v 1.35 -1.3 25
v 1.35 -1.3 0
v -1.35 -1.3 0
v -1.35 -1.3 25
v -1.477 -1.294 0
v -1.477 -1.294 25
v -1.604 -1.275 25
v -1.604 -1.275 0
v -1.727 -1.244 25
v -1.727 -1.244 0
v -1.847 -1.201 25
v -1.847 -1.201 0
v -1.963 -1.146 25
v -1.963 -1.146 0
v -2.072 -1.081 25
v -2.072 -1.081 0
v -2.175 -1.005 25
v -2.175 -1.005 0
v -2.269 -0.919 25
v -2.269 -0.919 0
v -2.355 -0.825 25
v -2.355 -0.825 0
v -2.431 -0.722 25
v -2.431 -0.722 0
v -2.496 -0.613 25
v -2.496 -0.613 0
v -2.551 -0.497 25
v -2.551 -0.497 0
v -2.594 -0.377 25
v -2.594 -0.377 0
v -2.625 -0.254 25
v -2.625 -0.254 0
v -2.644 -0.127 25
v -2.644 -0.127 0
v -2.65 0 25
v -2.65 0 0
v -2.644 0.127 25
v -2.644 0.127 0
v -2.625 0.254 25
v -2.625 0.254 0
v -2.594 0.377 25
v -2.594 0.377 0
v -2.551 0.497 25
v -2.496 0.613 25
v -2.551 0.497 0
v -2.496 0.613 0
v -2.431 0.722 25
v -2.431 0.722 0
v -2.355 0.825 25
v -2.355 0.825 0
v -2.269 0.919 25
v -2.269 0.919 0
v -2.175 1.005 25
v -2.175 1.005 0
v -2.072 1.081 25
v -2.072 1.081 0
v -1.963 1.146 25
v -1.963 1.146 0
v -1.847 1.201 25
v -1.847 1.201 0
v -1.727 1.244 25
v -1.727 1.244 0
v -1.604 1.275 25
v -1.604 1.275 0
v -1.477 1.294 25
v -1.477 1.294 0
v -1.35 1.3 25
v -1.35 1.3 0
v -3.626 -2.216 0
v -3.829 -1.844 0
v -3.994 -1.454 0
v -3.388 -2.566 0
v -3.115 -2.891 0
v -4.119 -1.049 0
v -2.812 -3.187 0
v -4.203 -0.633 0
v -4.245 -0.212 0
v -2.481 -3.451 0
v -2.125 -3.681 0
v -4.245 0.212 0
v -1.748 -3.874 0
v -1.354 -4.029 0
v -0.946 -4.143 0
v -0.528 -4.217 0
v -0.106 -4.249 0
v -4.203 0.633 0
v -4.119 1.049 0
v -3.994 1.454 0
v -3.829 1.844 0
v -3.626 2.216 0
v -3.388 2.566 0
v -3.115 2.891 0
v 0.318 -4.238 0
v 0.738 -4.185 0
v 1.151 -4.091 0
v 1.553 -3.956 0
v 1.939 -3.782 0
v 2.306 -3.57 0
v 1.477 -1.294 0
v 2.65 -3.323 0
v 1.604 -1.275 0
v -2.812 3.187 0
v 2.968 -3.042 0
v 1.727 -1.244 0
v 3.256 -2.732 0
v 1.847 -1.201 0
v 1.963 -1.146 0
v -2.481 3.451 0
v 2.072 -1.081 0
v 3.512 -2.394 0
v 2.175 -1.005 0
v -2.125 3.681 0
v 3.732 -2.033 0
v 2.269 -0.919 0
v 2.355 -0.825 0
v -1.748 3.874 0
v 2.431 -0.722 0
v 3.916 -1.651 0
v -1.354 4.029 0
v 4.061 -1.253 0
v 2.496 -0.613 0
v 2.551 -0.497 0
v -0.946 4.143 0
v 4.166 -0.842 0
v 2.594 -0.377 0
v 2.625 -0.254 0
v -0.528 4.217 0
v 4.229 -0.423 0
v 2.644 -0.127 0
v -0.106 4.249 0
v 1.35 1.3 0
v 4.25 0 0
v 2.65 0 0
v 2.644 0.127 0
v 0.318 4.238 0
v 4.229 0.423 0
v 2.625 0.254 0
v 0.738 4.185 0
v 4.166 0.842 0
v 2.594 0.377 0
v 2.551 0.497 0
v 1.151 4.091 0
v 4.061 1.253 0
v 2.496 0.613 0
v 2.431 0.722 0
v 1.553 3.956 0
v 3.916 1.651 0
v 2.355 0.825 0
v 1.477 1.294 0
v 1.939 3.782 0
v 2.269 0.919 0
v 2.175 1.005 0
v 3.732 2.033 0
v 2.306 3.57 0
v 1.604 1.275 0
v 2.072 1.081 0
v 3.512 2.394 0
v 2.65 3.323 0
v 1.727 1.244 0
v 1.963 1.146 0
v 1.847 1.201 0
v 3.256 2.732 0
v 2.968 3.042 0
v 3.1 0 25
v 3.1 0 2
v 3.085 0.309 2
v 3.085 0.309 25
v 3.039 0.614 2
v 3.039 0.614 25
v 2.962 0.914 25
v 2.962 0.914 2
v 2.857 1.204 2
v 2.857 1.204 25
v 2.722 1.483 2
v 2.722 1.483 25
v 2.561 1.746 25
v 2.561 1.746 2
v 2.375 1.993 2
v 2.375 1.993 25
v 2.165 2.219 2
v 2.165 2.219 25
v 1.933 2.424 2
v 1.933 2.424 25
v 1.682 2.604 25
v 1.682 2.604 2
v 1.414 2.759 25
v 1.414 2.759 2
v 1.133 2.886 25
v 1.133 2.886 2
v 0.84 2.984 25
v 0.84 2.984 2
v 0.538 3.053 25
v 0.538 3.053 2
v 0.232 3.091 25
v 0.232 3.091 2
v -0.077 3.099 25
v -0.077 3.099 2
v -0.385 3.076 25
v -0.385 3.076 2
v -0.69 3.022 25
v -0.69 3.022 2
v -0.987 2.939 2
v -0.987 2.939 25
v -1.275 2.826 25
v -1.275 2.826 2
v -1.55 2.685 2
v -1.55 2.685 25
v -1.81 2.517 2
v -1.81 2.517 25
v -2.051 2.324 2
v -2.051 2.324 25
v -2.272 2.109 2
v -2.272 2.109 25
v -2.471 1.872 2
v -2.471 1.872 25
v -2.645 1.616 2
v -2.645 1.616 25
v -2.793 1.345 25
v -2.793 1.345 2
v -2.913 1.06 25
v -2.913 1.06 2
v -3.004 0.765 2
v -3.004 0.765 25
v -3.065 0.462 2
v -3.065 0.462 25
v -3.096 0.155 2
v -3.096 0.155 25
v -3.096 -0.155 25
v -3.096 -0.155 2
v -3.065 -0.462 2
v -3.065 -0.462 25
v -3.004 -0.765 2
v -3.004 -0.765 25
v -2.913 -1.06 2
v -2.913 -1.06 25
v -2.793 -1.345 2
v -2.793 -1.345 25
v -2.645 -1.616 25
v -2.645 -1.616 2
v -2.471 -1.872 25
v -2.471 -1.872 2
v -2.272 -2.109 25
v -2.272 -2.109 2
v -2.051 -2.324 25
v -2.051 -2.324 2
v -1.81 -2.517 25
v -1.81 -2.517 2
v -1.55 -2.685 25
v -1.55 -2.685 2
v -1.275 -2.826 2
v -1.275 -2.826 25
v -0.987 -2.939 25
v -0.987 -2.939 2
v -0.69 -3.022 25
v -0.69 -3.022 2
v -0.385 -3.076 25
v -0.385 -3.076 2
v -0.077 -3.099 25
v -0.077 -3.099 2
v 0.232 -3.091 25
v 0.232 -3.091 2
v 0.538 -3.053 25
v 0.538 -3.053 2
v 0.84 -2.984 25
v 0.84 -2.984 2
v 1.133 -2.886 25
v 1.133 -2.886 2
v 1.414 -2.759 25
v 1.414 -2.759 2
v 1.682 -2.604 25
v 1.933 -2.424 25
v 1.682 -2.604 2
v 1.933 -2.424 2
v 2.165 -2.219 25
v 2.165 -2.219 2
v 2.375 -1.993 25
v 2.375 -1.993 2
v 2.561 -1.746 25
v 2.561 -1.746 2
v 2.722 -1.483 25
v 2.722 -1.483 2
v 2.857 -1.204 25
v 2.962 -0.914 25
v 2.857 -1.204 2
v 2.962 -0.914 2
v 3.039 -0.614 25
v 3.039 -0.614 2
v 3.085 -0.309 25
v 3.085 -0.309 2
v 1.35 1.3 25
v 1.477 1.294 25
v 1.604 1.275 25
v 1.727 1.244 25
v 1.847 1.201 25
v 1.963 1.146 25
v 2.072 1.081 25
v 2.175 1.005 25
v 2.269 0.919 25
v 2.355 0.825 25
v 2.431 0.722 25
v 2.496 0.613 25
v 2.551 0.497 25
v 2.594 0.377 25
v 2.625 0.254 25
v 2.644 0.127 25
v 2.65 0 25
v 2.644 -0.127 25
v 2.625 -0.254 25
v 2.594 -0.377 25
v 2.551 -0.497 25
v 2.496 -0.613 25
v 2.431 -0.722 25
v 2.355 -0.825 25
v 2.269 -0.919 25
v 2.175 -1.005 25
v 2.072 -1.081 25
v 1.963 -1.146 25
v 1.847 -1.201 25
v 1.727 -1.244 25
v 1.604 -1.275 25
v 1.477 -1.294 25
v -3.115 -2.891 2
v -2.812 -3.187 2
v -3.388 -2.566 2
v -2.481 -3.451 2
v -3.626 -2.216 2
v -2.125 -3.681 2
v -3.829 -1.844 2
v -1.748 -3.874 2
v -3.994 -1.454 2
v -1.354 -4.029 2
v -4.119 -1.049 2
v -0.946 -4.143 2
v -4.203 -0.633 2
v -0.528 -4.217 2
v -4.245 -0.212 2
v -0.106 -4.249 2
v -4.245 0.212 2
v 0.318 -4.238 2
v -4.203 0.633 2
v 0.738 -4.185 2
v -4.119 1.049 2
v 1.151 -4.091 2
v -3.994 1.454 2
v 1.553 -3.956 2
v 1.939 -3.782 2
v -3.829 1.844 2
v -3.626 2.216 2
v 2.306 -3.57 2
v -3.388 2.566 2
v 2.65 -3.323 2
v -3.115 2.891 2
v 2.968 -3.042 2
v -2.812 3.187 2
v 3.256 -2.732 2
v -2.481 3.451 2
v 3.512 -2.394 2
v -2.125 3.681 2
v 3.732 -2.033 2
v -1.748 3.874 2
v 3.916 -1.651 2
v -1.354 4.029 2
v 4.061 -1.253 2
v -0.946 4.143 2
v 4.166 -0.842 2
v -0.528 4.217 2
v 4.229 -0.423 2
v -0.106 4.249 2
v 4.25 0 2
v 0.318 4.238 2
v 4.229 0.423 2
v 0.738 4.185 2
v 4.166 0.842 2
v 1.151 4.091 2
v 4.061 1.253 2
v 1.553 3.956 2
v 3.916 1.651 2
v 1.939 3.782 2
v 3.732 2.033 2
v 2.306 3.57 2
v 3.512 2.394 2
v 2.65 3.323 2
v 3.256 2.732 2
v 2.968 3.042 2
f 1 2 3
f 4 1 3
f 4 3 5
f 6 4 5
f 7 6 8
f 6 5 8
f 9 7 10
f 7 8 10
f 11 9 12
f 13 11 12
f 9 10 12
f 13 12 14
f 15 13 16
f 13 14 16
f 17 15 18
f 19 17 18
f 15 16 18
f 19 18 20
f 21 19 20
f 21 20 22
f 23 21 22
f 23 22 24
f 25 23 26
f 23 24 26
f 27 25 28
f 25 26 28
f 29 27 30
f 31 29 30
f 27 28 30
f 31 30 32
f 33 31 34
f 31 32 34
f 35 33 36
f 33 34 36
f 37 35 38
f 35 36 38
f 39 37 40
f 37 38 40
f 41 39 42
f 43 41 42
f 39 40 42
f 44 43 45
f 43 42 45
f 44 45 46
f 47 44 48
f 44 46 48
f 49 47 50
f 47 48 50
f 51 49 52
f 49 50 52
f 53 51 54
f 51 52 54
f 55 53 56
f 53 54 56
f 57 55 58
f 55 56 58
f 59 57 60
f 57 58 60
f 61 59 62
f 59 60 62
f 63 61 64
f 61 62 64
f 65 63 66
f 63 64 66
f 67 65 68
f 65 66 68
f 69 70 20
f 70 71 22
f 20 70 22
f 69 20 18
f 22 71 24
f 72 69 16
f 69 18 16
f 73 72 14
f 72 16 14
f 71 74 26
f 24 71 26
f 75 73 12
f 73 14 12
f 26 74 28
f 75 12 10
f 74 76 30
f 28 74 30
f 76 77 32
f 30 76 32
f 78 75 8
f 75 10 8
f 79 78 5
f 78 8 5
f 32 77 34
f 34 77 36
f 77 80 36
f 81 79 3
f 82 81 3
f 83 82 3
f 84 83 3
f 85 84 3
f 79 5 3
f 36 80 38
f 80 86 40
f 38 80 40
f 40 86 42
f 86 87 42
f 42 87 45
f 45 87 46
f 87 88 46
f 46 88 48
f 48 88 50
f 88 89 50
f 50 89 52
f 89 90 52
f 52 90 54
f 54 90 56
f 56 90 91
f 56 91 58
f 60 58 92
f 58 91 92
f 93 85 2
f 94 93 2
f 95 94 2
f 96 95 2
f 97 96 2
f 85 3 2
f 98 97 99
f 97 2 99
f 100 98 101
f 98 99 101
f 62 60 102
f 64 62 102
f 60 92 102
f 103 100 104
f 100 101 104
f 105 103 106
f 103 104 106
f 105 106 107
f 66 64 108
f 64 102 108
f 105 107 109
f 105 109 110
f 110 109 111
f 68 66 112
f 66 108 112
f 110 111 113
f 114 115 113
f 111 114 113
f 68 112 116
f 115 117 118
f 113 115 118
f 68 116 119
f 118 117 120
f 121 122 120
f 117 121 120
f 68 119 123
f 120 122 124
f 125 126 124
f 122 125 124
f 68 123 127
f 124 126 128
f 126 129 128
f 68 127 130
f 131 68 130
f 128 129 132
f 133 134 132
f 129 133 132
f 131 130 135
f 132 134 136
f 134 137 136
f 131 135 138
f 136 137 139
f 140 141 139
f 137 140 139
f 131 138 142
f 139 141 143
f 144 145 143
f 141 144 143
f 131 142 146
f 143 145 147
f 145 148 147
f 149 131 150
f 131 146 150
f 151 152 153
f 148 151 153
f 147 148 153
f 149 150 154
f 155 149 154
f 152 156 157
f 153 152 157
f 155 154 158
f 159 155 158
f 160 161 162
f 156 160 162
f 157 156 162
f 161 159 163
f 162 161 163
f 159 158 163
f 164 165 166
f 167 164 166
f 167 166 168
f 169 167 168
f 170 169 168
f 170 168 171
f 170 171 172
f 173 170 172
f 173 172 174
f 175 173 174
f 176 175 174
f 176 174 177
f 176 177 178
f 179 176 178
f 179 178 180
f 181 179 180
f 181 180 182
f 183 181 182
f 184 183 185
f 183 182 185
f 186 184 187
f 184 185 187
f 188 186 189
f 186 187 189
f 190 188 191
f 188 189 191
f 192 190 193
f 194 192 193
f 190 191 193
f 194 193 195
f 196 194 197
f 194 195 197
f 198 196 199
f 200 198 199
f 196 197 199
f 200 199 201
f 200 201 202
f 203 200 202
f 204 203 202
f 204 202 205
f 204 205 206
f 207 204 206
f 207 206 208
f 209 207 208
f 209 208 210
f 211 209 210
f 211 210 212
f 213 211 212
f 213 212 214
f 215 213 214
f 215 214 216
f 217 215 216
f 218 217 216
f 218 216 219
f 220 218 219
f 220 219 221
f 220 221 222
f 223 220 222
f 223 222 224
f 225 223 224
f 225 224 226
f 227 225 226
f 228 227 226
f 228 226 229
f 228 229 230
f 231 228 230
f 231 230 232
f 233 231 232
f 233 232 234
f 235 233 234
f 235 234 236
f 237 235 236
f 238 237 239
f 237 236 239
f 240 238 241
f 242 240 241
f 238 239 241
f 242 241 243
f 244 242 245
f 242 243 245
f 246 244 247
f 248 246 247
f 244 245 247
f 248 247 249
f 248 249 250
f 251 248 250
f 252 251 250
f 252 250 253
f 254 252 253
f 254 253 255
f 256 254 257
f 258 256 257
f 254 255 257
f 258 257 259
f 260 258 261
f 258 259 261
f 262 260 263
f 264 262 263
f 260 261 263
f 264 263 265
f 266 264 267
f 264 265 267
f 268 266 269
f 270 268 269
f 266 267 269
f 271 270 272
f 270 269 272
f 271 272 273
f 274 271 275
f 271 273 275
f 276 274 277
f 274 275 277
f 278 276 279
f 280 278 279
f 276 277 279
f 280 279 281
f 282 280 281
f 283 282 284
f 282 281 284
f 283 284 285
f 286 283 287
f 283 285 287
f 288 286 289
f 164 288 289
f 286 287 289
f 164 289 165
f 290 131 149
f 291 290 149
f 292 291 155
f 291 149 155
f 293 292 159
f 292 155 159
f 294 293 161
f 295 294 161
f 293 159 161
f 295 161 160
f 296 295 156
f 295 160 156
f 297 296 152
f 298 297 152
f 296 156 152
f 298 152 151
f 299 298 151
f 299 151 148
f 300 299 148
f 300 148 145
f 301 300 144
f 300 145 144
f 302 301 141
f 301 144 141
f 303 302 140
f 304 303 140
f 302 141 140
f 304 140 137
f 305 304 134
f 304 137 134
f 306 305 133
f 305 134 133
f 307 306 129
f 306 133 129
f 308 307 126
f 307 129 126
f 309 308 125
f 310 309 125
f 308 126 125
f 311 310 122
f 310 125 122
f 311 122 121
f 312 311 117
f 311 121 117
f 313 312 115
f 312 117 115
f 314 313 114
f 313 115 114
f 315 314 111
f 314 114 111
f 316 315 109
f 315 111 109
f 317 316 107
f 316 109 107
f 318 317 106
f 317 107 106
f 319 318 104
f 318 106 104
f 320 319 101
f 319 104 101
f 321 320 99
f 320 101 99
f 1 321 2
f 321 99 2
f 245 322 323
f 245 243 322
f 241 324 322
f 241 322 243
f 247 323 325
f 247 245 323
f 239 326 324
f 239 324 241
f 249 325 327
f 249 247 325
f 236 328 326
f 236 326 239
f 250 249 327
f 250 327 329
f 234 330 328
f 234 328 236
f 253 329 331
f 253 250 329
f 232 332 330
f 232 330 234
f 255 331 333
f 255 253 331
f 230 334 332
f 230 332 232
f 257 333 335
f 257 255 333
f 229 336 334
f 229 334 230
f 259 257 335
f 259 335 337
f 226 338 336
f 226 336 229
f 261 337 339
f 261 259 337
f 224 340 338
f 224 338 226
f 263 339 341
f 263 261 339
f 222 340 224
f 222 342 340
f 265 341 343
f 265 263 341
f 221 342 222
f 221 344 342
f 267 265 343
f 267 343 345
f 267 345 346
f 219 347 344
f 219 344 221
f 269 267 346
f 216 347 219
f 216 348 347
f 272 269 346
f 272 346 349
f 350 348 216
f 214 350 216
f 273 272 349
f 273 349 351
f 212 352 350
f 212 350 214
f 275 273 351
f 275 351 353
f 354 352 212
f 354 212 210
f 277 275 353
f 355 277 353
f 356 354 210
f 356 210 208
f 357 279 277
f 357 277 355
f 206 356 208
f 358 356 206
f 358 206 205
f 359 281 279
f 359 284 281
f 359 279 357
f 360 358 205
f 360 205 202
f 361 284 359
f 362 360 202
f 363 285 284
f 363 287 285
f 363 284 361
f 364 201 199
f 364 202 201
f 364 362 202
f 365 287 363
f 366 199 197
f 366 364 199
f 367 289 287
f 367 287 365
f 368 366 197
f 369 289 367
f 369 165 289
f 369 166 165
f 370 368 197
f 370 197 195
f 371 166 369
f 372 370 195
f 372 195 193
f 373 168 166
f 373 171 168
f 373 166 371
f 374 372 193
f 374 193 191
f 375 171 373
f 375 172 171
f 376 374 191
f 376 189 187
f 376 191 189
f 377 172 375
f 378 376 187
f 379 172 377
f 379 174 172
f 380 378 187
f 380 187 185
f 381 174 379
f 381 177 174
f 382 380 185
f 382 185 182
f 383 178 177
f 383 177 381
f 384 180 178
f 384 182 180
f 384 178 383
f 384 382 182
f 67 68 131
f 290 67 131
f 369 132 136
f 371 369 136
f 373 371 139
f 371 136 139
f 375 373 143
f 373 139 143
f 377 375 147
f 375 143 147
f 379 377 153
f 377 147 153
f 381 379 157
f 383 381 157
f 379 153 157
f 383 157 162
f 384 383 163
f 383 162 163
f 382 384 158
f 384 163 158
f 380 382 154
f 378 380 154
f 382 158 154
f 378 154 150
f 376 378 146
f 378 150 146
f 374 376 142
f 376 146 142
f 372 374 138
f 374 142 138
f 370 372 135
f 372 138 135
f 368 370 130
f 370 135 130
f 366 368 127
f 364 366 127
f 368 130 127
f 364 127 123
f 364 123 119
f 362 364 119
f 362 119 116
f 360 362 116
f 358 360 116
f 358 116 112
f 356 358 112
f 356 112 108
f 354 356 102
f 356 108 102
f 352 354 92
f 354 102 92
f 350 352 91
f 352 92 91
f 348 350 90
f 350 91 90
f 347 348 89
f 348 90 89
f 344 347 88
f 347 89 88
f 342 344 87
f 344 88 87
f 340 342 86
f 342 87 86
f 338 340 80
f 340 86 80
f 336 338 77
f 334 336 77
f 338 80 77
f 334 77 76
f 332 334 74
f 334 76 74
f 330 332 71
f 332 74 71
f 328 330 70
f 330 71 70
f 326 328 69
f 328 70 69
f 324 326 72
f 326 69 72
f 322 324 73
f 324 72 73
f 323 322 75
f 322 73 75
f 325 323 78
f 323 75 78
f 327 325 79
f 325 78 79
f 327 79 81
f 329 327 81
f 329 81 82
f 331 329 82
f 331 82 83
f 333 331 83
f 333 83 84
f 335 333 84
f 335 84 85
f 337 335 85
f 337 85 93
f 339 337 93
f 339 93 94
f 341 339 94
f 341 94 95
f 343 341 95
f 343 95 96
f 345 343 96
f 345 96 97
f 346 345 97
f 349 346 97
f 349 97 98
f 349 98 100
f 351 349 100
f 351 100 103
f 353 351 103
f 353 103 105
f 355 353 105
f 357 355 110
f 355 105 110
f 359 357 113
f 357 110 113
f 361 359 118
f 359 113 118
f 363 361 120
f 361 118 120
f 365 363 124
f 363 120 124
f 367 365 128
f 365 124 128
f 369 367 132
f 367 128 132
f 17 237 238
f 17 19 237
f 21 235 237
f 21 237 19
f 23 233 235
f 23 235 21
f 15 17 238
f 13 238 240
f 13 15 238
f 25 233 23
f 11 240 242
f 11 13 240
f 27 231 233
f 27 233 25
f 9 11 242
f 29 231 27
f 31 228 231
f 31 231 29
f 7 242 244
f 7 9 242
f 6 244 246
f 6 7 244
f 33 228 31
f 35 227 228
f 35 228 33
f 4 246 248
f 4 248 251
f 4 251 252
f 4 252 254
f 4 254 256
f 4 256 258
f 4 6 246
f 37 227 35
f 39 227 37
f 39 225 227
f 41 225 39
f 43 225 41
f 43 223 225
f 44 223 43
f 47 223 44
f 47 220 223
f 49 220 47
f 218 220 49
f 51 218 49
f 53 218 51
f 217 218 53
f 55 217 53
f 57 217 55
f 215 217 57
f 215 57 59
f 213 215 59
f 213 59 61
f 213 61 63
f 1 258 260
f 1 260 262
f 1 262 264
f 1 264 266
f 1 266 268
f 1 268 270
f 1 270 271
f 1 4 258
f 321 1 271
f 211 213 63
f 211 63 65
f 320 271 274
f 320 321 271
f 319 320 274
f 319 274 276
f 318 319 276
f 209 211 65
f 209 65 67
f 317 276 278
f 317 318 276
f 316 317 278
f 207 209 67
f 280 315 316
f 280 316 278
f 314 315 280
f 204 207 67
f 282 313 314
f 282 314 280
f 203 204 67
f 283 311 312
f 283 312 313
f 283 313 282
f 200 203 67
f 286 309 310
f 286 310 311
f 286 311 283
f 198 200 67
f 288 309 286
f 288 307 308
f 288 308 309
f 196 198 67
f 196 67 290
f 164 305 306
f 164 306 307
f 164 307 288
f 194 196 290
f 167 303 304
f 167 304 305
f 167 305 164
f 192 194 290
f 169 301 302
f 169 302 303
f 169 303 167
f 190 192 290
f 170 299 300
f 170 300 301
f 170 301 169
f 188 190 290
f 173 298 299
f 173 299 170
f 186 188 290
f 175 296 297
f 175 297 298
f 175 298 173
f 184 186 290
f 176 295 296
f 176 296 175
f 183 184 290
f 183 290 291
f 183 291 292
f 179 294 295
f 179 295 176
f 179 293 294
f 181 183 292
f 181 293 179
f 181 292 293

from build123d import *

# Parameters (mm, degrees)
F0_R     = 4.25
F0_R_2   = 3.1
F1_DEPTH = 2
F2_DEPTH = 25


with BuildPart() as f1:
    # F0 (on Top) → F1 (new body)
    with BuildSketch(Plane.XY):
        Circle(F0_R)
        Circle(F0_R_2, mode=Mode.SUBTRACT)
    extrude(amount=F1_DEPTH)

    # F0 (on Top) → F2 (join)
    with BuildSketch(Plane.XY):
        Circle(F0_R_2)
        with BuildLine():
            Line((-1.35, 1.3), (1.35, 1.3))
            ThreePointArc((1.35, 1.3), (2.65, 0), (1.35, -1.3))
            Line((1.35, -1.3), (-1.35, -1.3))
            ThreePointArc((-1.35, -1.3), (-2.65, 0), (-1.35, 1.3))
        make_face(mode=Mode.SUBTRACT)
    extrude(amount=F2_DEPTH)


solid = f1.part
